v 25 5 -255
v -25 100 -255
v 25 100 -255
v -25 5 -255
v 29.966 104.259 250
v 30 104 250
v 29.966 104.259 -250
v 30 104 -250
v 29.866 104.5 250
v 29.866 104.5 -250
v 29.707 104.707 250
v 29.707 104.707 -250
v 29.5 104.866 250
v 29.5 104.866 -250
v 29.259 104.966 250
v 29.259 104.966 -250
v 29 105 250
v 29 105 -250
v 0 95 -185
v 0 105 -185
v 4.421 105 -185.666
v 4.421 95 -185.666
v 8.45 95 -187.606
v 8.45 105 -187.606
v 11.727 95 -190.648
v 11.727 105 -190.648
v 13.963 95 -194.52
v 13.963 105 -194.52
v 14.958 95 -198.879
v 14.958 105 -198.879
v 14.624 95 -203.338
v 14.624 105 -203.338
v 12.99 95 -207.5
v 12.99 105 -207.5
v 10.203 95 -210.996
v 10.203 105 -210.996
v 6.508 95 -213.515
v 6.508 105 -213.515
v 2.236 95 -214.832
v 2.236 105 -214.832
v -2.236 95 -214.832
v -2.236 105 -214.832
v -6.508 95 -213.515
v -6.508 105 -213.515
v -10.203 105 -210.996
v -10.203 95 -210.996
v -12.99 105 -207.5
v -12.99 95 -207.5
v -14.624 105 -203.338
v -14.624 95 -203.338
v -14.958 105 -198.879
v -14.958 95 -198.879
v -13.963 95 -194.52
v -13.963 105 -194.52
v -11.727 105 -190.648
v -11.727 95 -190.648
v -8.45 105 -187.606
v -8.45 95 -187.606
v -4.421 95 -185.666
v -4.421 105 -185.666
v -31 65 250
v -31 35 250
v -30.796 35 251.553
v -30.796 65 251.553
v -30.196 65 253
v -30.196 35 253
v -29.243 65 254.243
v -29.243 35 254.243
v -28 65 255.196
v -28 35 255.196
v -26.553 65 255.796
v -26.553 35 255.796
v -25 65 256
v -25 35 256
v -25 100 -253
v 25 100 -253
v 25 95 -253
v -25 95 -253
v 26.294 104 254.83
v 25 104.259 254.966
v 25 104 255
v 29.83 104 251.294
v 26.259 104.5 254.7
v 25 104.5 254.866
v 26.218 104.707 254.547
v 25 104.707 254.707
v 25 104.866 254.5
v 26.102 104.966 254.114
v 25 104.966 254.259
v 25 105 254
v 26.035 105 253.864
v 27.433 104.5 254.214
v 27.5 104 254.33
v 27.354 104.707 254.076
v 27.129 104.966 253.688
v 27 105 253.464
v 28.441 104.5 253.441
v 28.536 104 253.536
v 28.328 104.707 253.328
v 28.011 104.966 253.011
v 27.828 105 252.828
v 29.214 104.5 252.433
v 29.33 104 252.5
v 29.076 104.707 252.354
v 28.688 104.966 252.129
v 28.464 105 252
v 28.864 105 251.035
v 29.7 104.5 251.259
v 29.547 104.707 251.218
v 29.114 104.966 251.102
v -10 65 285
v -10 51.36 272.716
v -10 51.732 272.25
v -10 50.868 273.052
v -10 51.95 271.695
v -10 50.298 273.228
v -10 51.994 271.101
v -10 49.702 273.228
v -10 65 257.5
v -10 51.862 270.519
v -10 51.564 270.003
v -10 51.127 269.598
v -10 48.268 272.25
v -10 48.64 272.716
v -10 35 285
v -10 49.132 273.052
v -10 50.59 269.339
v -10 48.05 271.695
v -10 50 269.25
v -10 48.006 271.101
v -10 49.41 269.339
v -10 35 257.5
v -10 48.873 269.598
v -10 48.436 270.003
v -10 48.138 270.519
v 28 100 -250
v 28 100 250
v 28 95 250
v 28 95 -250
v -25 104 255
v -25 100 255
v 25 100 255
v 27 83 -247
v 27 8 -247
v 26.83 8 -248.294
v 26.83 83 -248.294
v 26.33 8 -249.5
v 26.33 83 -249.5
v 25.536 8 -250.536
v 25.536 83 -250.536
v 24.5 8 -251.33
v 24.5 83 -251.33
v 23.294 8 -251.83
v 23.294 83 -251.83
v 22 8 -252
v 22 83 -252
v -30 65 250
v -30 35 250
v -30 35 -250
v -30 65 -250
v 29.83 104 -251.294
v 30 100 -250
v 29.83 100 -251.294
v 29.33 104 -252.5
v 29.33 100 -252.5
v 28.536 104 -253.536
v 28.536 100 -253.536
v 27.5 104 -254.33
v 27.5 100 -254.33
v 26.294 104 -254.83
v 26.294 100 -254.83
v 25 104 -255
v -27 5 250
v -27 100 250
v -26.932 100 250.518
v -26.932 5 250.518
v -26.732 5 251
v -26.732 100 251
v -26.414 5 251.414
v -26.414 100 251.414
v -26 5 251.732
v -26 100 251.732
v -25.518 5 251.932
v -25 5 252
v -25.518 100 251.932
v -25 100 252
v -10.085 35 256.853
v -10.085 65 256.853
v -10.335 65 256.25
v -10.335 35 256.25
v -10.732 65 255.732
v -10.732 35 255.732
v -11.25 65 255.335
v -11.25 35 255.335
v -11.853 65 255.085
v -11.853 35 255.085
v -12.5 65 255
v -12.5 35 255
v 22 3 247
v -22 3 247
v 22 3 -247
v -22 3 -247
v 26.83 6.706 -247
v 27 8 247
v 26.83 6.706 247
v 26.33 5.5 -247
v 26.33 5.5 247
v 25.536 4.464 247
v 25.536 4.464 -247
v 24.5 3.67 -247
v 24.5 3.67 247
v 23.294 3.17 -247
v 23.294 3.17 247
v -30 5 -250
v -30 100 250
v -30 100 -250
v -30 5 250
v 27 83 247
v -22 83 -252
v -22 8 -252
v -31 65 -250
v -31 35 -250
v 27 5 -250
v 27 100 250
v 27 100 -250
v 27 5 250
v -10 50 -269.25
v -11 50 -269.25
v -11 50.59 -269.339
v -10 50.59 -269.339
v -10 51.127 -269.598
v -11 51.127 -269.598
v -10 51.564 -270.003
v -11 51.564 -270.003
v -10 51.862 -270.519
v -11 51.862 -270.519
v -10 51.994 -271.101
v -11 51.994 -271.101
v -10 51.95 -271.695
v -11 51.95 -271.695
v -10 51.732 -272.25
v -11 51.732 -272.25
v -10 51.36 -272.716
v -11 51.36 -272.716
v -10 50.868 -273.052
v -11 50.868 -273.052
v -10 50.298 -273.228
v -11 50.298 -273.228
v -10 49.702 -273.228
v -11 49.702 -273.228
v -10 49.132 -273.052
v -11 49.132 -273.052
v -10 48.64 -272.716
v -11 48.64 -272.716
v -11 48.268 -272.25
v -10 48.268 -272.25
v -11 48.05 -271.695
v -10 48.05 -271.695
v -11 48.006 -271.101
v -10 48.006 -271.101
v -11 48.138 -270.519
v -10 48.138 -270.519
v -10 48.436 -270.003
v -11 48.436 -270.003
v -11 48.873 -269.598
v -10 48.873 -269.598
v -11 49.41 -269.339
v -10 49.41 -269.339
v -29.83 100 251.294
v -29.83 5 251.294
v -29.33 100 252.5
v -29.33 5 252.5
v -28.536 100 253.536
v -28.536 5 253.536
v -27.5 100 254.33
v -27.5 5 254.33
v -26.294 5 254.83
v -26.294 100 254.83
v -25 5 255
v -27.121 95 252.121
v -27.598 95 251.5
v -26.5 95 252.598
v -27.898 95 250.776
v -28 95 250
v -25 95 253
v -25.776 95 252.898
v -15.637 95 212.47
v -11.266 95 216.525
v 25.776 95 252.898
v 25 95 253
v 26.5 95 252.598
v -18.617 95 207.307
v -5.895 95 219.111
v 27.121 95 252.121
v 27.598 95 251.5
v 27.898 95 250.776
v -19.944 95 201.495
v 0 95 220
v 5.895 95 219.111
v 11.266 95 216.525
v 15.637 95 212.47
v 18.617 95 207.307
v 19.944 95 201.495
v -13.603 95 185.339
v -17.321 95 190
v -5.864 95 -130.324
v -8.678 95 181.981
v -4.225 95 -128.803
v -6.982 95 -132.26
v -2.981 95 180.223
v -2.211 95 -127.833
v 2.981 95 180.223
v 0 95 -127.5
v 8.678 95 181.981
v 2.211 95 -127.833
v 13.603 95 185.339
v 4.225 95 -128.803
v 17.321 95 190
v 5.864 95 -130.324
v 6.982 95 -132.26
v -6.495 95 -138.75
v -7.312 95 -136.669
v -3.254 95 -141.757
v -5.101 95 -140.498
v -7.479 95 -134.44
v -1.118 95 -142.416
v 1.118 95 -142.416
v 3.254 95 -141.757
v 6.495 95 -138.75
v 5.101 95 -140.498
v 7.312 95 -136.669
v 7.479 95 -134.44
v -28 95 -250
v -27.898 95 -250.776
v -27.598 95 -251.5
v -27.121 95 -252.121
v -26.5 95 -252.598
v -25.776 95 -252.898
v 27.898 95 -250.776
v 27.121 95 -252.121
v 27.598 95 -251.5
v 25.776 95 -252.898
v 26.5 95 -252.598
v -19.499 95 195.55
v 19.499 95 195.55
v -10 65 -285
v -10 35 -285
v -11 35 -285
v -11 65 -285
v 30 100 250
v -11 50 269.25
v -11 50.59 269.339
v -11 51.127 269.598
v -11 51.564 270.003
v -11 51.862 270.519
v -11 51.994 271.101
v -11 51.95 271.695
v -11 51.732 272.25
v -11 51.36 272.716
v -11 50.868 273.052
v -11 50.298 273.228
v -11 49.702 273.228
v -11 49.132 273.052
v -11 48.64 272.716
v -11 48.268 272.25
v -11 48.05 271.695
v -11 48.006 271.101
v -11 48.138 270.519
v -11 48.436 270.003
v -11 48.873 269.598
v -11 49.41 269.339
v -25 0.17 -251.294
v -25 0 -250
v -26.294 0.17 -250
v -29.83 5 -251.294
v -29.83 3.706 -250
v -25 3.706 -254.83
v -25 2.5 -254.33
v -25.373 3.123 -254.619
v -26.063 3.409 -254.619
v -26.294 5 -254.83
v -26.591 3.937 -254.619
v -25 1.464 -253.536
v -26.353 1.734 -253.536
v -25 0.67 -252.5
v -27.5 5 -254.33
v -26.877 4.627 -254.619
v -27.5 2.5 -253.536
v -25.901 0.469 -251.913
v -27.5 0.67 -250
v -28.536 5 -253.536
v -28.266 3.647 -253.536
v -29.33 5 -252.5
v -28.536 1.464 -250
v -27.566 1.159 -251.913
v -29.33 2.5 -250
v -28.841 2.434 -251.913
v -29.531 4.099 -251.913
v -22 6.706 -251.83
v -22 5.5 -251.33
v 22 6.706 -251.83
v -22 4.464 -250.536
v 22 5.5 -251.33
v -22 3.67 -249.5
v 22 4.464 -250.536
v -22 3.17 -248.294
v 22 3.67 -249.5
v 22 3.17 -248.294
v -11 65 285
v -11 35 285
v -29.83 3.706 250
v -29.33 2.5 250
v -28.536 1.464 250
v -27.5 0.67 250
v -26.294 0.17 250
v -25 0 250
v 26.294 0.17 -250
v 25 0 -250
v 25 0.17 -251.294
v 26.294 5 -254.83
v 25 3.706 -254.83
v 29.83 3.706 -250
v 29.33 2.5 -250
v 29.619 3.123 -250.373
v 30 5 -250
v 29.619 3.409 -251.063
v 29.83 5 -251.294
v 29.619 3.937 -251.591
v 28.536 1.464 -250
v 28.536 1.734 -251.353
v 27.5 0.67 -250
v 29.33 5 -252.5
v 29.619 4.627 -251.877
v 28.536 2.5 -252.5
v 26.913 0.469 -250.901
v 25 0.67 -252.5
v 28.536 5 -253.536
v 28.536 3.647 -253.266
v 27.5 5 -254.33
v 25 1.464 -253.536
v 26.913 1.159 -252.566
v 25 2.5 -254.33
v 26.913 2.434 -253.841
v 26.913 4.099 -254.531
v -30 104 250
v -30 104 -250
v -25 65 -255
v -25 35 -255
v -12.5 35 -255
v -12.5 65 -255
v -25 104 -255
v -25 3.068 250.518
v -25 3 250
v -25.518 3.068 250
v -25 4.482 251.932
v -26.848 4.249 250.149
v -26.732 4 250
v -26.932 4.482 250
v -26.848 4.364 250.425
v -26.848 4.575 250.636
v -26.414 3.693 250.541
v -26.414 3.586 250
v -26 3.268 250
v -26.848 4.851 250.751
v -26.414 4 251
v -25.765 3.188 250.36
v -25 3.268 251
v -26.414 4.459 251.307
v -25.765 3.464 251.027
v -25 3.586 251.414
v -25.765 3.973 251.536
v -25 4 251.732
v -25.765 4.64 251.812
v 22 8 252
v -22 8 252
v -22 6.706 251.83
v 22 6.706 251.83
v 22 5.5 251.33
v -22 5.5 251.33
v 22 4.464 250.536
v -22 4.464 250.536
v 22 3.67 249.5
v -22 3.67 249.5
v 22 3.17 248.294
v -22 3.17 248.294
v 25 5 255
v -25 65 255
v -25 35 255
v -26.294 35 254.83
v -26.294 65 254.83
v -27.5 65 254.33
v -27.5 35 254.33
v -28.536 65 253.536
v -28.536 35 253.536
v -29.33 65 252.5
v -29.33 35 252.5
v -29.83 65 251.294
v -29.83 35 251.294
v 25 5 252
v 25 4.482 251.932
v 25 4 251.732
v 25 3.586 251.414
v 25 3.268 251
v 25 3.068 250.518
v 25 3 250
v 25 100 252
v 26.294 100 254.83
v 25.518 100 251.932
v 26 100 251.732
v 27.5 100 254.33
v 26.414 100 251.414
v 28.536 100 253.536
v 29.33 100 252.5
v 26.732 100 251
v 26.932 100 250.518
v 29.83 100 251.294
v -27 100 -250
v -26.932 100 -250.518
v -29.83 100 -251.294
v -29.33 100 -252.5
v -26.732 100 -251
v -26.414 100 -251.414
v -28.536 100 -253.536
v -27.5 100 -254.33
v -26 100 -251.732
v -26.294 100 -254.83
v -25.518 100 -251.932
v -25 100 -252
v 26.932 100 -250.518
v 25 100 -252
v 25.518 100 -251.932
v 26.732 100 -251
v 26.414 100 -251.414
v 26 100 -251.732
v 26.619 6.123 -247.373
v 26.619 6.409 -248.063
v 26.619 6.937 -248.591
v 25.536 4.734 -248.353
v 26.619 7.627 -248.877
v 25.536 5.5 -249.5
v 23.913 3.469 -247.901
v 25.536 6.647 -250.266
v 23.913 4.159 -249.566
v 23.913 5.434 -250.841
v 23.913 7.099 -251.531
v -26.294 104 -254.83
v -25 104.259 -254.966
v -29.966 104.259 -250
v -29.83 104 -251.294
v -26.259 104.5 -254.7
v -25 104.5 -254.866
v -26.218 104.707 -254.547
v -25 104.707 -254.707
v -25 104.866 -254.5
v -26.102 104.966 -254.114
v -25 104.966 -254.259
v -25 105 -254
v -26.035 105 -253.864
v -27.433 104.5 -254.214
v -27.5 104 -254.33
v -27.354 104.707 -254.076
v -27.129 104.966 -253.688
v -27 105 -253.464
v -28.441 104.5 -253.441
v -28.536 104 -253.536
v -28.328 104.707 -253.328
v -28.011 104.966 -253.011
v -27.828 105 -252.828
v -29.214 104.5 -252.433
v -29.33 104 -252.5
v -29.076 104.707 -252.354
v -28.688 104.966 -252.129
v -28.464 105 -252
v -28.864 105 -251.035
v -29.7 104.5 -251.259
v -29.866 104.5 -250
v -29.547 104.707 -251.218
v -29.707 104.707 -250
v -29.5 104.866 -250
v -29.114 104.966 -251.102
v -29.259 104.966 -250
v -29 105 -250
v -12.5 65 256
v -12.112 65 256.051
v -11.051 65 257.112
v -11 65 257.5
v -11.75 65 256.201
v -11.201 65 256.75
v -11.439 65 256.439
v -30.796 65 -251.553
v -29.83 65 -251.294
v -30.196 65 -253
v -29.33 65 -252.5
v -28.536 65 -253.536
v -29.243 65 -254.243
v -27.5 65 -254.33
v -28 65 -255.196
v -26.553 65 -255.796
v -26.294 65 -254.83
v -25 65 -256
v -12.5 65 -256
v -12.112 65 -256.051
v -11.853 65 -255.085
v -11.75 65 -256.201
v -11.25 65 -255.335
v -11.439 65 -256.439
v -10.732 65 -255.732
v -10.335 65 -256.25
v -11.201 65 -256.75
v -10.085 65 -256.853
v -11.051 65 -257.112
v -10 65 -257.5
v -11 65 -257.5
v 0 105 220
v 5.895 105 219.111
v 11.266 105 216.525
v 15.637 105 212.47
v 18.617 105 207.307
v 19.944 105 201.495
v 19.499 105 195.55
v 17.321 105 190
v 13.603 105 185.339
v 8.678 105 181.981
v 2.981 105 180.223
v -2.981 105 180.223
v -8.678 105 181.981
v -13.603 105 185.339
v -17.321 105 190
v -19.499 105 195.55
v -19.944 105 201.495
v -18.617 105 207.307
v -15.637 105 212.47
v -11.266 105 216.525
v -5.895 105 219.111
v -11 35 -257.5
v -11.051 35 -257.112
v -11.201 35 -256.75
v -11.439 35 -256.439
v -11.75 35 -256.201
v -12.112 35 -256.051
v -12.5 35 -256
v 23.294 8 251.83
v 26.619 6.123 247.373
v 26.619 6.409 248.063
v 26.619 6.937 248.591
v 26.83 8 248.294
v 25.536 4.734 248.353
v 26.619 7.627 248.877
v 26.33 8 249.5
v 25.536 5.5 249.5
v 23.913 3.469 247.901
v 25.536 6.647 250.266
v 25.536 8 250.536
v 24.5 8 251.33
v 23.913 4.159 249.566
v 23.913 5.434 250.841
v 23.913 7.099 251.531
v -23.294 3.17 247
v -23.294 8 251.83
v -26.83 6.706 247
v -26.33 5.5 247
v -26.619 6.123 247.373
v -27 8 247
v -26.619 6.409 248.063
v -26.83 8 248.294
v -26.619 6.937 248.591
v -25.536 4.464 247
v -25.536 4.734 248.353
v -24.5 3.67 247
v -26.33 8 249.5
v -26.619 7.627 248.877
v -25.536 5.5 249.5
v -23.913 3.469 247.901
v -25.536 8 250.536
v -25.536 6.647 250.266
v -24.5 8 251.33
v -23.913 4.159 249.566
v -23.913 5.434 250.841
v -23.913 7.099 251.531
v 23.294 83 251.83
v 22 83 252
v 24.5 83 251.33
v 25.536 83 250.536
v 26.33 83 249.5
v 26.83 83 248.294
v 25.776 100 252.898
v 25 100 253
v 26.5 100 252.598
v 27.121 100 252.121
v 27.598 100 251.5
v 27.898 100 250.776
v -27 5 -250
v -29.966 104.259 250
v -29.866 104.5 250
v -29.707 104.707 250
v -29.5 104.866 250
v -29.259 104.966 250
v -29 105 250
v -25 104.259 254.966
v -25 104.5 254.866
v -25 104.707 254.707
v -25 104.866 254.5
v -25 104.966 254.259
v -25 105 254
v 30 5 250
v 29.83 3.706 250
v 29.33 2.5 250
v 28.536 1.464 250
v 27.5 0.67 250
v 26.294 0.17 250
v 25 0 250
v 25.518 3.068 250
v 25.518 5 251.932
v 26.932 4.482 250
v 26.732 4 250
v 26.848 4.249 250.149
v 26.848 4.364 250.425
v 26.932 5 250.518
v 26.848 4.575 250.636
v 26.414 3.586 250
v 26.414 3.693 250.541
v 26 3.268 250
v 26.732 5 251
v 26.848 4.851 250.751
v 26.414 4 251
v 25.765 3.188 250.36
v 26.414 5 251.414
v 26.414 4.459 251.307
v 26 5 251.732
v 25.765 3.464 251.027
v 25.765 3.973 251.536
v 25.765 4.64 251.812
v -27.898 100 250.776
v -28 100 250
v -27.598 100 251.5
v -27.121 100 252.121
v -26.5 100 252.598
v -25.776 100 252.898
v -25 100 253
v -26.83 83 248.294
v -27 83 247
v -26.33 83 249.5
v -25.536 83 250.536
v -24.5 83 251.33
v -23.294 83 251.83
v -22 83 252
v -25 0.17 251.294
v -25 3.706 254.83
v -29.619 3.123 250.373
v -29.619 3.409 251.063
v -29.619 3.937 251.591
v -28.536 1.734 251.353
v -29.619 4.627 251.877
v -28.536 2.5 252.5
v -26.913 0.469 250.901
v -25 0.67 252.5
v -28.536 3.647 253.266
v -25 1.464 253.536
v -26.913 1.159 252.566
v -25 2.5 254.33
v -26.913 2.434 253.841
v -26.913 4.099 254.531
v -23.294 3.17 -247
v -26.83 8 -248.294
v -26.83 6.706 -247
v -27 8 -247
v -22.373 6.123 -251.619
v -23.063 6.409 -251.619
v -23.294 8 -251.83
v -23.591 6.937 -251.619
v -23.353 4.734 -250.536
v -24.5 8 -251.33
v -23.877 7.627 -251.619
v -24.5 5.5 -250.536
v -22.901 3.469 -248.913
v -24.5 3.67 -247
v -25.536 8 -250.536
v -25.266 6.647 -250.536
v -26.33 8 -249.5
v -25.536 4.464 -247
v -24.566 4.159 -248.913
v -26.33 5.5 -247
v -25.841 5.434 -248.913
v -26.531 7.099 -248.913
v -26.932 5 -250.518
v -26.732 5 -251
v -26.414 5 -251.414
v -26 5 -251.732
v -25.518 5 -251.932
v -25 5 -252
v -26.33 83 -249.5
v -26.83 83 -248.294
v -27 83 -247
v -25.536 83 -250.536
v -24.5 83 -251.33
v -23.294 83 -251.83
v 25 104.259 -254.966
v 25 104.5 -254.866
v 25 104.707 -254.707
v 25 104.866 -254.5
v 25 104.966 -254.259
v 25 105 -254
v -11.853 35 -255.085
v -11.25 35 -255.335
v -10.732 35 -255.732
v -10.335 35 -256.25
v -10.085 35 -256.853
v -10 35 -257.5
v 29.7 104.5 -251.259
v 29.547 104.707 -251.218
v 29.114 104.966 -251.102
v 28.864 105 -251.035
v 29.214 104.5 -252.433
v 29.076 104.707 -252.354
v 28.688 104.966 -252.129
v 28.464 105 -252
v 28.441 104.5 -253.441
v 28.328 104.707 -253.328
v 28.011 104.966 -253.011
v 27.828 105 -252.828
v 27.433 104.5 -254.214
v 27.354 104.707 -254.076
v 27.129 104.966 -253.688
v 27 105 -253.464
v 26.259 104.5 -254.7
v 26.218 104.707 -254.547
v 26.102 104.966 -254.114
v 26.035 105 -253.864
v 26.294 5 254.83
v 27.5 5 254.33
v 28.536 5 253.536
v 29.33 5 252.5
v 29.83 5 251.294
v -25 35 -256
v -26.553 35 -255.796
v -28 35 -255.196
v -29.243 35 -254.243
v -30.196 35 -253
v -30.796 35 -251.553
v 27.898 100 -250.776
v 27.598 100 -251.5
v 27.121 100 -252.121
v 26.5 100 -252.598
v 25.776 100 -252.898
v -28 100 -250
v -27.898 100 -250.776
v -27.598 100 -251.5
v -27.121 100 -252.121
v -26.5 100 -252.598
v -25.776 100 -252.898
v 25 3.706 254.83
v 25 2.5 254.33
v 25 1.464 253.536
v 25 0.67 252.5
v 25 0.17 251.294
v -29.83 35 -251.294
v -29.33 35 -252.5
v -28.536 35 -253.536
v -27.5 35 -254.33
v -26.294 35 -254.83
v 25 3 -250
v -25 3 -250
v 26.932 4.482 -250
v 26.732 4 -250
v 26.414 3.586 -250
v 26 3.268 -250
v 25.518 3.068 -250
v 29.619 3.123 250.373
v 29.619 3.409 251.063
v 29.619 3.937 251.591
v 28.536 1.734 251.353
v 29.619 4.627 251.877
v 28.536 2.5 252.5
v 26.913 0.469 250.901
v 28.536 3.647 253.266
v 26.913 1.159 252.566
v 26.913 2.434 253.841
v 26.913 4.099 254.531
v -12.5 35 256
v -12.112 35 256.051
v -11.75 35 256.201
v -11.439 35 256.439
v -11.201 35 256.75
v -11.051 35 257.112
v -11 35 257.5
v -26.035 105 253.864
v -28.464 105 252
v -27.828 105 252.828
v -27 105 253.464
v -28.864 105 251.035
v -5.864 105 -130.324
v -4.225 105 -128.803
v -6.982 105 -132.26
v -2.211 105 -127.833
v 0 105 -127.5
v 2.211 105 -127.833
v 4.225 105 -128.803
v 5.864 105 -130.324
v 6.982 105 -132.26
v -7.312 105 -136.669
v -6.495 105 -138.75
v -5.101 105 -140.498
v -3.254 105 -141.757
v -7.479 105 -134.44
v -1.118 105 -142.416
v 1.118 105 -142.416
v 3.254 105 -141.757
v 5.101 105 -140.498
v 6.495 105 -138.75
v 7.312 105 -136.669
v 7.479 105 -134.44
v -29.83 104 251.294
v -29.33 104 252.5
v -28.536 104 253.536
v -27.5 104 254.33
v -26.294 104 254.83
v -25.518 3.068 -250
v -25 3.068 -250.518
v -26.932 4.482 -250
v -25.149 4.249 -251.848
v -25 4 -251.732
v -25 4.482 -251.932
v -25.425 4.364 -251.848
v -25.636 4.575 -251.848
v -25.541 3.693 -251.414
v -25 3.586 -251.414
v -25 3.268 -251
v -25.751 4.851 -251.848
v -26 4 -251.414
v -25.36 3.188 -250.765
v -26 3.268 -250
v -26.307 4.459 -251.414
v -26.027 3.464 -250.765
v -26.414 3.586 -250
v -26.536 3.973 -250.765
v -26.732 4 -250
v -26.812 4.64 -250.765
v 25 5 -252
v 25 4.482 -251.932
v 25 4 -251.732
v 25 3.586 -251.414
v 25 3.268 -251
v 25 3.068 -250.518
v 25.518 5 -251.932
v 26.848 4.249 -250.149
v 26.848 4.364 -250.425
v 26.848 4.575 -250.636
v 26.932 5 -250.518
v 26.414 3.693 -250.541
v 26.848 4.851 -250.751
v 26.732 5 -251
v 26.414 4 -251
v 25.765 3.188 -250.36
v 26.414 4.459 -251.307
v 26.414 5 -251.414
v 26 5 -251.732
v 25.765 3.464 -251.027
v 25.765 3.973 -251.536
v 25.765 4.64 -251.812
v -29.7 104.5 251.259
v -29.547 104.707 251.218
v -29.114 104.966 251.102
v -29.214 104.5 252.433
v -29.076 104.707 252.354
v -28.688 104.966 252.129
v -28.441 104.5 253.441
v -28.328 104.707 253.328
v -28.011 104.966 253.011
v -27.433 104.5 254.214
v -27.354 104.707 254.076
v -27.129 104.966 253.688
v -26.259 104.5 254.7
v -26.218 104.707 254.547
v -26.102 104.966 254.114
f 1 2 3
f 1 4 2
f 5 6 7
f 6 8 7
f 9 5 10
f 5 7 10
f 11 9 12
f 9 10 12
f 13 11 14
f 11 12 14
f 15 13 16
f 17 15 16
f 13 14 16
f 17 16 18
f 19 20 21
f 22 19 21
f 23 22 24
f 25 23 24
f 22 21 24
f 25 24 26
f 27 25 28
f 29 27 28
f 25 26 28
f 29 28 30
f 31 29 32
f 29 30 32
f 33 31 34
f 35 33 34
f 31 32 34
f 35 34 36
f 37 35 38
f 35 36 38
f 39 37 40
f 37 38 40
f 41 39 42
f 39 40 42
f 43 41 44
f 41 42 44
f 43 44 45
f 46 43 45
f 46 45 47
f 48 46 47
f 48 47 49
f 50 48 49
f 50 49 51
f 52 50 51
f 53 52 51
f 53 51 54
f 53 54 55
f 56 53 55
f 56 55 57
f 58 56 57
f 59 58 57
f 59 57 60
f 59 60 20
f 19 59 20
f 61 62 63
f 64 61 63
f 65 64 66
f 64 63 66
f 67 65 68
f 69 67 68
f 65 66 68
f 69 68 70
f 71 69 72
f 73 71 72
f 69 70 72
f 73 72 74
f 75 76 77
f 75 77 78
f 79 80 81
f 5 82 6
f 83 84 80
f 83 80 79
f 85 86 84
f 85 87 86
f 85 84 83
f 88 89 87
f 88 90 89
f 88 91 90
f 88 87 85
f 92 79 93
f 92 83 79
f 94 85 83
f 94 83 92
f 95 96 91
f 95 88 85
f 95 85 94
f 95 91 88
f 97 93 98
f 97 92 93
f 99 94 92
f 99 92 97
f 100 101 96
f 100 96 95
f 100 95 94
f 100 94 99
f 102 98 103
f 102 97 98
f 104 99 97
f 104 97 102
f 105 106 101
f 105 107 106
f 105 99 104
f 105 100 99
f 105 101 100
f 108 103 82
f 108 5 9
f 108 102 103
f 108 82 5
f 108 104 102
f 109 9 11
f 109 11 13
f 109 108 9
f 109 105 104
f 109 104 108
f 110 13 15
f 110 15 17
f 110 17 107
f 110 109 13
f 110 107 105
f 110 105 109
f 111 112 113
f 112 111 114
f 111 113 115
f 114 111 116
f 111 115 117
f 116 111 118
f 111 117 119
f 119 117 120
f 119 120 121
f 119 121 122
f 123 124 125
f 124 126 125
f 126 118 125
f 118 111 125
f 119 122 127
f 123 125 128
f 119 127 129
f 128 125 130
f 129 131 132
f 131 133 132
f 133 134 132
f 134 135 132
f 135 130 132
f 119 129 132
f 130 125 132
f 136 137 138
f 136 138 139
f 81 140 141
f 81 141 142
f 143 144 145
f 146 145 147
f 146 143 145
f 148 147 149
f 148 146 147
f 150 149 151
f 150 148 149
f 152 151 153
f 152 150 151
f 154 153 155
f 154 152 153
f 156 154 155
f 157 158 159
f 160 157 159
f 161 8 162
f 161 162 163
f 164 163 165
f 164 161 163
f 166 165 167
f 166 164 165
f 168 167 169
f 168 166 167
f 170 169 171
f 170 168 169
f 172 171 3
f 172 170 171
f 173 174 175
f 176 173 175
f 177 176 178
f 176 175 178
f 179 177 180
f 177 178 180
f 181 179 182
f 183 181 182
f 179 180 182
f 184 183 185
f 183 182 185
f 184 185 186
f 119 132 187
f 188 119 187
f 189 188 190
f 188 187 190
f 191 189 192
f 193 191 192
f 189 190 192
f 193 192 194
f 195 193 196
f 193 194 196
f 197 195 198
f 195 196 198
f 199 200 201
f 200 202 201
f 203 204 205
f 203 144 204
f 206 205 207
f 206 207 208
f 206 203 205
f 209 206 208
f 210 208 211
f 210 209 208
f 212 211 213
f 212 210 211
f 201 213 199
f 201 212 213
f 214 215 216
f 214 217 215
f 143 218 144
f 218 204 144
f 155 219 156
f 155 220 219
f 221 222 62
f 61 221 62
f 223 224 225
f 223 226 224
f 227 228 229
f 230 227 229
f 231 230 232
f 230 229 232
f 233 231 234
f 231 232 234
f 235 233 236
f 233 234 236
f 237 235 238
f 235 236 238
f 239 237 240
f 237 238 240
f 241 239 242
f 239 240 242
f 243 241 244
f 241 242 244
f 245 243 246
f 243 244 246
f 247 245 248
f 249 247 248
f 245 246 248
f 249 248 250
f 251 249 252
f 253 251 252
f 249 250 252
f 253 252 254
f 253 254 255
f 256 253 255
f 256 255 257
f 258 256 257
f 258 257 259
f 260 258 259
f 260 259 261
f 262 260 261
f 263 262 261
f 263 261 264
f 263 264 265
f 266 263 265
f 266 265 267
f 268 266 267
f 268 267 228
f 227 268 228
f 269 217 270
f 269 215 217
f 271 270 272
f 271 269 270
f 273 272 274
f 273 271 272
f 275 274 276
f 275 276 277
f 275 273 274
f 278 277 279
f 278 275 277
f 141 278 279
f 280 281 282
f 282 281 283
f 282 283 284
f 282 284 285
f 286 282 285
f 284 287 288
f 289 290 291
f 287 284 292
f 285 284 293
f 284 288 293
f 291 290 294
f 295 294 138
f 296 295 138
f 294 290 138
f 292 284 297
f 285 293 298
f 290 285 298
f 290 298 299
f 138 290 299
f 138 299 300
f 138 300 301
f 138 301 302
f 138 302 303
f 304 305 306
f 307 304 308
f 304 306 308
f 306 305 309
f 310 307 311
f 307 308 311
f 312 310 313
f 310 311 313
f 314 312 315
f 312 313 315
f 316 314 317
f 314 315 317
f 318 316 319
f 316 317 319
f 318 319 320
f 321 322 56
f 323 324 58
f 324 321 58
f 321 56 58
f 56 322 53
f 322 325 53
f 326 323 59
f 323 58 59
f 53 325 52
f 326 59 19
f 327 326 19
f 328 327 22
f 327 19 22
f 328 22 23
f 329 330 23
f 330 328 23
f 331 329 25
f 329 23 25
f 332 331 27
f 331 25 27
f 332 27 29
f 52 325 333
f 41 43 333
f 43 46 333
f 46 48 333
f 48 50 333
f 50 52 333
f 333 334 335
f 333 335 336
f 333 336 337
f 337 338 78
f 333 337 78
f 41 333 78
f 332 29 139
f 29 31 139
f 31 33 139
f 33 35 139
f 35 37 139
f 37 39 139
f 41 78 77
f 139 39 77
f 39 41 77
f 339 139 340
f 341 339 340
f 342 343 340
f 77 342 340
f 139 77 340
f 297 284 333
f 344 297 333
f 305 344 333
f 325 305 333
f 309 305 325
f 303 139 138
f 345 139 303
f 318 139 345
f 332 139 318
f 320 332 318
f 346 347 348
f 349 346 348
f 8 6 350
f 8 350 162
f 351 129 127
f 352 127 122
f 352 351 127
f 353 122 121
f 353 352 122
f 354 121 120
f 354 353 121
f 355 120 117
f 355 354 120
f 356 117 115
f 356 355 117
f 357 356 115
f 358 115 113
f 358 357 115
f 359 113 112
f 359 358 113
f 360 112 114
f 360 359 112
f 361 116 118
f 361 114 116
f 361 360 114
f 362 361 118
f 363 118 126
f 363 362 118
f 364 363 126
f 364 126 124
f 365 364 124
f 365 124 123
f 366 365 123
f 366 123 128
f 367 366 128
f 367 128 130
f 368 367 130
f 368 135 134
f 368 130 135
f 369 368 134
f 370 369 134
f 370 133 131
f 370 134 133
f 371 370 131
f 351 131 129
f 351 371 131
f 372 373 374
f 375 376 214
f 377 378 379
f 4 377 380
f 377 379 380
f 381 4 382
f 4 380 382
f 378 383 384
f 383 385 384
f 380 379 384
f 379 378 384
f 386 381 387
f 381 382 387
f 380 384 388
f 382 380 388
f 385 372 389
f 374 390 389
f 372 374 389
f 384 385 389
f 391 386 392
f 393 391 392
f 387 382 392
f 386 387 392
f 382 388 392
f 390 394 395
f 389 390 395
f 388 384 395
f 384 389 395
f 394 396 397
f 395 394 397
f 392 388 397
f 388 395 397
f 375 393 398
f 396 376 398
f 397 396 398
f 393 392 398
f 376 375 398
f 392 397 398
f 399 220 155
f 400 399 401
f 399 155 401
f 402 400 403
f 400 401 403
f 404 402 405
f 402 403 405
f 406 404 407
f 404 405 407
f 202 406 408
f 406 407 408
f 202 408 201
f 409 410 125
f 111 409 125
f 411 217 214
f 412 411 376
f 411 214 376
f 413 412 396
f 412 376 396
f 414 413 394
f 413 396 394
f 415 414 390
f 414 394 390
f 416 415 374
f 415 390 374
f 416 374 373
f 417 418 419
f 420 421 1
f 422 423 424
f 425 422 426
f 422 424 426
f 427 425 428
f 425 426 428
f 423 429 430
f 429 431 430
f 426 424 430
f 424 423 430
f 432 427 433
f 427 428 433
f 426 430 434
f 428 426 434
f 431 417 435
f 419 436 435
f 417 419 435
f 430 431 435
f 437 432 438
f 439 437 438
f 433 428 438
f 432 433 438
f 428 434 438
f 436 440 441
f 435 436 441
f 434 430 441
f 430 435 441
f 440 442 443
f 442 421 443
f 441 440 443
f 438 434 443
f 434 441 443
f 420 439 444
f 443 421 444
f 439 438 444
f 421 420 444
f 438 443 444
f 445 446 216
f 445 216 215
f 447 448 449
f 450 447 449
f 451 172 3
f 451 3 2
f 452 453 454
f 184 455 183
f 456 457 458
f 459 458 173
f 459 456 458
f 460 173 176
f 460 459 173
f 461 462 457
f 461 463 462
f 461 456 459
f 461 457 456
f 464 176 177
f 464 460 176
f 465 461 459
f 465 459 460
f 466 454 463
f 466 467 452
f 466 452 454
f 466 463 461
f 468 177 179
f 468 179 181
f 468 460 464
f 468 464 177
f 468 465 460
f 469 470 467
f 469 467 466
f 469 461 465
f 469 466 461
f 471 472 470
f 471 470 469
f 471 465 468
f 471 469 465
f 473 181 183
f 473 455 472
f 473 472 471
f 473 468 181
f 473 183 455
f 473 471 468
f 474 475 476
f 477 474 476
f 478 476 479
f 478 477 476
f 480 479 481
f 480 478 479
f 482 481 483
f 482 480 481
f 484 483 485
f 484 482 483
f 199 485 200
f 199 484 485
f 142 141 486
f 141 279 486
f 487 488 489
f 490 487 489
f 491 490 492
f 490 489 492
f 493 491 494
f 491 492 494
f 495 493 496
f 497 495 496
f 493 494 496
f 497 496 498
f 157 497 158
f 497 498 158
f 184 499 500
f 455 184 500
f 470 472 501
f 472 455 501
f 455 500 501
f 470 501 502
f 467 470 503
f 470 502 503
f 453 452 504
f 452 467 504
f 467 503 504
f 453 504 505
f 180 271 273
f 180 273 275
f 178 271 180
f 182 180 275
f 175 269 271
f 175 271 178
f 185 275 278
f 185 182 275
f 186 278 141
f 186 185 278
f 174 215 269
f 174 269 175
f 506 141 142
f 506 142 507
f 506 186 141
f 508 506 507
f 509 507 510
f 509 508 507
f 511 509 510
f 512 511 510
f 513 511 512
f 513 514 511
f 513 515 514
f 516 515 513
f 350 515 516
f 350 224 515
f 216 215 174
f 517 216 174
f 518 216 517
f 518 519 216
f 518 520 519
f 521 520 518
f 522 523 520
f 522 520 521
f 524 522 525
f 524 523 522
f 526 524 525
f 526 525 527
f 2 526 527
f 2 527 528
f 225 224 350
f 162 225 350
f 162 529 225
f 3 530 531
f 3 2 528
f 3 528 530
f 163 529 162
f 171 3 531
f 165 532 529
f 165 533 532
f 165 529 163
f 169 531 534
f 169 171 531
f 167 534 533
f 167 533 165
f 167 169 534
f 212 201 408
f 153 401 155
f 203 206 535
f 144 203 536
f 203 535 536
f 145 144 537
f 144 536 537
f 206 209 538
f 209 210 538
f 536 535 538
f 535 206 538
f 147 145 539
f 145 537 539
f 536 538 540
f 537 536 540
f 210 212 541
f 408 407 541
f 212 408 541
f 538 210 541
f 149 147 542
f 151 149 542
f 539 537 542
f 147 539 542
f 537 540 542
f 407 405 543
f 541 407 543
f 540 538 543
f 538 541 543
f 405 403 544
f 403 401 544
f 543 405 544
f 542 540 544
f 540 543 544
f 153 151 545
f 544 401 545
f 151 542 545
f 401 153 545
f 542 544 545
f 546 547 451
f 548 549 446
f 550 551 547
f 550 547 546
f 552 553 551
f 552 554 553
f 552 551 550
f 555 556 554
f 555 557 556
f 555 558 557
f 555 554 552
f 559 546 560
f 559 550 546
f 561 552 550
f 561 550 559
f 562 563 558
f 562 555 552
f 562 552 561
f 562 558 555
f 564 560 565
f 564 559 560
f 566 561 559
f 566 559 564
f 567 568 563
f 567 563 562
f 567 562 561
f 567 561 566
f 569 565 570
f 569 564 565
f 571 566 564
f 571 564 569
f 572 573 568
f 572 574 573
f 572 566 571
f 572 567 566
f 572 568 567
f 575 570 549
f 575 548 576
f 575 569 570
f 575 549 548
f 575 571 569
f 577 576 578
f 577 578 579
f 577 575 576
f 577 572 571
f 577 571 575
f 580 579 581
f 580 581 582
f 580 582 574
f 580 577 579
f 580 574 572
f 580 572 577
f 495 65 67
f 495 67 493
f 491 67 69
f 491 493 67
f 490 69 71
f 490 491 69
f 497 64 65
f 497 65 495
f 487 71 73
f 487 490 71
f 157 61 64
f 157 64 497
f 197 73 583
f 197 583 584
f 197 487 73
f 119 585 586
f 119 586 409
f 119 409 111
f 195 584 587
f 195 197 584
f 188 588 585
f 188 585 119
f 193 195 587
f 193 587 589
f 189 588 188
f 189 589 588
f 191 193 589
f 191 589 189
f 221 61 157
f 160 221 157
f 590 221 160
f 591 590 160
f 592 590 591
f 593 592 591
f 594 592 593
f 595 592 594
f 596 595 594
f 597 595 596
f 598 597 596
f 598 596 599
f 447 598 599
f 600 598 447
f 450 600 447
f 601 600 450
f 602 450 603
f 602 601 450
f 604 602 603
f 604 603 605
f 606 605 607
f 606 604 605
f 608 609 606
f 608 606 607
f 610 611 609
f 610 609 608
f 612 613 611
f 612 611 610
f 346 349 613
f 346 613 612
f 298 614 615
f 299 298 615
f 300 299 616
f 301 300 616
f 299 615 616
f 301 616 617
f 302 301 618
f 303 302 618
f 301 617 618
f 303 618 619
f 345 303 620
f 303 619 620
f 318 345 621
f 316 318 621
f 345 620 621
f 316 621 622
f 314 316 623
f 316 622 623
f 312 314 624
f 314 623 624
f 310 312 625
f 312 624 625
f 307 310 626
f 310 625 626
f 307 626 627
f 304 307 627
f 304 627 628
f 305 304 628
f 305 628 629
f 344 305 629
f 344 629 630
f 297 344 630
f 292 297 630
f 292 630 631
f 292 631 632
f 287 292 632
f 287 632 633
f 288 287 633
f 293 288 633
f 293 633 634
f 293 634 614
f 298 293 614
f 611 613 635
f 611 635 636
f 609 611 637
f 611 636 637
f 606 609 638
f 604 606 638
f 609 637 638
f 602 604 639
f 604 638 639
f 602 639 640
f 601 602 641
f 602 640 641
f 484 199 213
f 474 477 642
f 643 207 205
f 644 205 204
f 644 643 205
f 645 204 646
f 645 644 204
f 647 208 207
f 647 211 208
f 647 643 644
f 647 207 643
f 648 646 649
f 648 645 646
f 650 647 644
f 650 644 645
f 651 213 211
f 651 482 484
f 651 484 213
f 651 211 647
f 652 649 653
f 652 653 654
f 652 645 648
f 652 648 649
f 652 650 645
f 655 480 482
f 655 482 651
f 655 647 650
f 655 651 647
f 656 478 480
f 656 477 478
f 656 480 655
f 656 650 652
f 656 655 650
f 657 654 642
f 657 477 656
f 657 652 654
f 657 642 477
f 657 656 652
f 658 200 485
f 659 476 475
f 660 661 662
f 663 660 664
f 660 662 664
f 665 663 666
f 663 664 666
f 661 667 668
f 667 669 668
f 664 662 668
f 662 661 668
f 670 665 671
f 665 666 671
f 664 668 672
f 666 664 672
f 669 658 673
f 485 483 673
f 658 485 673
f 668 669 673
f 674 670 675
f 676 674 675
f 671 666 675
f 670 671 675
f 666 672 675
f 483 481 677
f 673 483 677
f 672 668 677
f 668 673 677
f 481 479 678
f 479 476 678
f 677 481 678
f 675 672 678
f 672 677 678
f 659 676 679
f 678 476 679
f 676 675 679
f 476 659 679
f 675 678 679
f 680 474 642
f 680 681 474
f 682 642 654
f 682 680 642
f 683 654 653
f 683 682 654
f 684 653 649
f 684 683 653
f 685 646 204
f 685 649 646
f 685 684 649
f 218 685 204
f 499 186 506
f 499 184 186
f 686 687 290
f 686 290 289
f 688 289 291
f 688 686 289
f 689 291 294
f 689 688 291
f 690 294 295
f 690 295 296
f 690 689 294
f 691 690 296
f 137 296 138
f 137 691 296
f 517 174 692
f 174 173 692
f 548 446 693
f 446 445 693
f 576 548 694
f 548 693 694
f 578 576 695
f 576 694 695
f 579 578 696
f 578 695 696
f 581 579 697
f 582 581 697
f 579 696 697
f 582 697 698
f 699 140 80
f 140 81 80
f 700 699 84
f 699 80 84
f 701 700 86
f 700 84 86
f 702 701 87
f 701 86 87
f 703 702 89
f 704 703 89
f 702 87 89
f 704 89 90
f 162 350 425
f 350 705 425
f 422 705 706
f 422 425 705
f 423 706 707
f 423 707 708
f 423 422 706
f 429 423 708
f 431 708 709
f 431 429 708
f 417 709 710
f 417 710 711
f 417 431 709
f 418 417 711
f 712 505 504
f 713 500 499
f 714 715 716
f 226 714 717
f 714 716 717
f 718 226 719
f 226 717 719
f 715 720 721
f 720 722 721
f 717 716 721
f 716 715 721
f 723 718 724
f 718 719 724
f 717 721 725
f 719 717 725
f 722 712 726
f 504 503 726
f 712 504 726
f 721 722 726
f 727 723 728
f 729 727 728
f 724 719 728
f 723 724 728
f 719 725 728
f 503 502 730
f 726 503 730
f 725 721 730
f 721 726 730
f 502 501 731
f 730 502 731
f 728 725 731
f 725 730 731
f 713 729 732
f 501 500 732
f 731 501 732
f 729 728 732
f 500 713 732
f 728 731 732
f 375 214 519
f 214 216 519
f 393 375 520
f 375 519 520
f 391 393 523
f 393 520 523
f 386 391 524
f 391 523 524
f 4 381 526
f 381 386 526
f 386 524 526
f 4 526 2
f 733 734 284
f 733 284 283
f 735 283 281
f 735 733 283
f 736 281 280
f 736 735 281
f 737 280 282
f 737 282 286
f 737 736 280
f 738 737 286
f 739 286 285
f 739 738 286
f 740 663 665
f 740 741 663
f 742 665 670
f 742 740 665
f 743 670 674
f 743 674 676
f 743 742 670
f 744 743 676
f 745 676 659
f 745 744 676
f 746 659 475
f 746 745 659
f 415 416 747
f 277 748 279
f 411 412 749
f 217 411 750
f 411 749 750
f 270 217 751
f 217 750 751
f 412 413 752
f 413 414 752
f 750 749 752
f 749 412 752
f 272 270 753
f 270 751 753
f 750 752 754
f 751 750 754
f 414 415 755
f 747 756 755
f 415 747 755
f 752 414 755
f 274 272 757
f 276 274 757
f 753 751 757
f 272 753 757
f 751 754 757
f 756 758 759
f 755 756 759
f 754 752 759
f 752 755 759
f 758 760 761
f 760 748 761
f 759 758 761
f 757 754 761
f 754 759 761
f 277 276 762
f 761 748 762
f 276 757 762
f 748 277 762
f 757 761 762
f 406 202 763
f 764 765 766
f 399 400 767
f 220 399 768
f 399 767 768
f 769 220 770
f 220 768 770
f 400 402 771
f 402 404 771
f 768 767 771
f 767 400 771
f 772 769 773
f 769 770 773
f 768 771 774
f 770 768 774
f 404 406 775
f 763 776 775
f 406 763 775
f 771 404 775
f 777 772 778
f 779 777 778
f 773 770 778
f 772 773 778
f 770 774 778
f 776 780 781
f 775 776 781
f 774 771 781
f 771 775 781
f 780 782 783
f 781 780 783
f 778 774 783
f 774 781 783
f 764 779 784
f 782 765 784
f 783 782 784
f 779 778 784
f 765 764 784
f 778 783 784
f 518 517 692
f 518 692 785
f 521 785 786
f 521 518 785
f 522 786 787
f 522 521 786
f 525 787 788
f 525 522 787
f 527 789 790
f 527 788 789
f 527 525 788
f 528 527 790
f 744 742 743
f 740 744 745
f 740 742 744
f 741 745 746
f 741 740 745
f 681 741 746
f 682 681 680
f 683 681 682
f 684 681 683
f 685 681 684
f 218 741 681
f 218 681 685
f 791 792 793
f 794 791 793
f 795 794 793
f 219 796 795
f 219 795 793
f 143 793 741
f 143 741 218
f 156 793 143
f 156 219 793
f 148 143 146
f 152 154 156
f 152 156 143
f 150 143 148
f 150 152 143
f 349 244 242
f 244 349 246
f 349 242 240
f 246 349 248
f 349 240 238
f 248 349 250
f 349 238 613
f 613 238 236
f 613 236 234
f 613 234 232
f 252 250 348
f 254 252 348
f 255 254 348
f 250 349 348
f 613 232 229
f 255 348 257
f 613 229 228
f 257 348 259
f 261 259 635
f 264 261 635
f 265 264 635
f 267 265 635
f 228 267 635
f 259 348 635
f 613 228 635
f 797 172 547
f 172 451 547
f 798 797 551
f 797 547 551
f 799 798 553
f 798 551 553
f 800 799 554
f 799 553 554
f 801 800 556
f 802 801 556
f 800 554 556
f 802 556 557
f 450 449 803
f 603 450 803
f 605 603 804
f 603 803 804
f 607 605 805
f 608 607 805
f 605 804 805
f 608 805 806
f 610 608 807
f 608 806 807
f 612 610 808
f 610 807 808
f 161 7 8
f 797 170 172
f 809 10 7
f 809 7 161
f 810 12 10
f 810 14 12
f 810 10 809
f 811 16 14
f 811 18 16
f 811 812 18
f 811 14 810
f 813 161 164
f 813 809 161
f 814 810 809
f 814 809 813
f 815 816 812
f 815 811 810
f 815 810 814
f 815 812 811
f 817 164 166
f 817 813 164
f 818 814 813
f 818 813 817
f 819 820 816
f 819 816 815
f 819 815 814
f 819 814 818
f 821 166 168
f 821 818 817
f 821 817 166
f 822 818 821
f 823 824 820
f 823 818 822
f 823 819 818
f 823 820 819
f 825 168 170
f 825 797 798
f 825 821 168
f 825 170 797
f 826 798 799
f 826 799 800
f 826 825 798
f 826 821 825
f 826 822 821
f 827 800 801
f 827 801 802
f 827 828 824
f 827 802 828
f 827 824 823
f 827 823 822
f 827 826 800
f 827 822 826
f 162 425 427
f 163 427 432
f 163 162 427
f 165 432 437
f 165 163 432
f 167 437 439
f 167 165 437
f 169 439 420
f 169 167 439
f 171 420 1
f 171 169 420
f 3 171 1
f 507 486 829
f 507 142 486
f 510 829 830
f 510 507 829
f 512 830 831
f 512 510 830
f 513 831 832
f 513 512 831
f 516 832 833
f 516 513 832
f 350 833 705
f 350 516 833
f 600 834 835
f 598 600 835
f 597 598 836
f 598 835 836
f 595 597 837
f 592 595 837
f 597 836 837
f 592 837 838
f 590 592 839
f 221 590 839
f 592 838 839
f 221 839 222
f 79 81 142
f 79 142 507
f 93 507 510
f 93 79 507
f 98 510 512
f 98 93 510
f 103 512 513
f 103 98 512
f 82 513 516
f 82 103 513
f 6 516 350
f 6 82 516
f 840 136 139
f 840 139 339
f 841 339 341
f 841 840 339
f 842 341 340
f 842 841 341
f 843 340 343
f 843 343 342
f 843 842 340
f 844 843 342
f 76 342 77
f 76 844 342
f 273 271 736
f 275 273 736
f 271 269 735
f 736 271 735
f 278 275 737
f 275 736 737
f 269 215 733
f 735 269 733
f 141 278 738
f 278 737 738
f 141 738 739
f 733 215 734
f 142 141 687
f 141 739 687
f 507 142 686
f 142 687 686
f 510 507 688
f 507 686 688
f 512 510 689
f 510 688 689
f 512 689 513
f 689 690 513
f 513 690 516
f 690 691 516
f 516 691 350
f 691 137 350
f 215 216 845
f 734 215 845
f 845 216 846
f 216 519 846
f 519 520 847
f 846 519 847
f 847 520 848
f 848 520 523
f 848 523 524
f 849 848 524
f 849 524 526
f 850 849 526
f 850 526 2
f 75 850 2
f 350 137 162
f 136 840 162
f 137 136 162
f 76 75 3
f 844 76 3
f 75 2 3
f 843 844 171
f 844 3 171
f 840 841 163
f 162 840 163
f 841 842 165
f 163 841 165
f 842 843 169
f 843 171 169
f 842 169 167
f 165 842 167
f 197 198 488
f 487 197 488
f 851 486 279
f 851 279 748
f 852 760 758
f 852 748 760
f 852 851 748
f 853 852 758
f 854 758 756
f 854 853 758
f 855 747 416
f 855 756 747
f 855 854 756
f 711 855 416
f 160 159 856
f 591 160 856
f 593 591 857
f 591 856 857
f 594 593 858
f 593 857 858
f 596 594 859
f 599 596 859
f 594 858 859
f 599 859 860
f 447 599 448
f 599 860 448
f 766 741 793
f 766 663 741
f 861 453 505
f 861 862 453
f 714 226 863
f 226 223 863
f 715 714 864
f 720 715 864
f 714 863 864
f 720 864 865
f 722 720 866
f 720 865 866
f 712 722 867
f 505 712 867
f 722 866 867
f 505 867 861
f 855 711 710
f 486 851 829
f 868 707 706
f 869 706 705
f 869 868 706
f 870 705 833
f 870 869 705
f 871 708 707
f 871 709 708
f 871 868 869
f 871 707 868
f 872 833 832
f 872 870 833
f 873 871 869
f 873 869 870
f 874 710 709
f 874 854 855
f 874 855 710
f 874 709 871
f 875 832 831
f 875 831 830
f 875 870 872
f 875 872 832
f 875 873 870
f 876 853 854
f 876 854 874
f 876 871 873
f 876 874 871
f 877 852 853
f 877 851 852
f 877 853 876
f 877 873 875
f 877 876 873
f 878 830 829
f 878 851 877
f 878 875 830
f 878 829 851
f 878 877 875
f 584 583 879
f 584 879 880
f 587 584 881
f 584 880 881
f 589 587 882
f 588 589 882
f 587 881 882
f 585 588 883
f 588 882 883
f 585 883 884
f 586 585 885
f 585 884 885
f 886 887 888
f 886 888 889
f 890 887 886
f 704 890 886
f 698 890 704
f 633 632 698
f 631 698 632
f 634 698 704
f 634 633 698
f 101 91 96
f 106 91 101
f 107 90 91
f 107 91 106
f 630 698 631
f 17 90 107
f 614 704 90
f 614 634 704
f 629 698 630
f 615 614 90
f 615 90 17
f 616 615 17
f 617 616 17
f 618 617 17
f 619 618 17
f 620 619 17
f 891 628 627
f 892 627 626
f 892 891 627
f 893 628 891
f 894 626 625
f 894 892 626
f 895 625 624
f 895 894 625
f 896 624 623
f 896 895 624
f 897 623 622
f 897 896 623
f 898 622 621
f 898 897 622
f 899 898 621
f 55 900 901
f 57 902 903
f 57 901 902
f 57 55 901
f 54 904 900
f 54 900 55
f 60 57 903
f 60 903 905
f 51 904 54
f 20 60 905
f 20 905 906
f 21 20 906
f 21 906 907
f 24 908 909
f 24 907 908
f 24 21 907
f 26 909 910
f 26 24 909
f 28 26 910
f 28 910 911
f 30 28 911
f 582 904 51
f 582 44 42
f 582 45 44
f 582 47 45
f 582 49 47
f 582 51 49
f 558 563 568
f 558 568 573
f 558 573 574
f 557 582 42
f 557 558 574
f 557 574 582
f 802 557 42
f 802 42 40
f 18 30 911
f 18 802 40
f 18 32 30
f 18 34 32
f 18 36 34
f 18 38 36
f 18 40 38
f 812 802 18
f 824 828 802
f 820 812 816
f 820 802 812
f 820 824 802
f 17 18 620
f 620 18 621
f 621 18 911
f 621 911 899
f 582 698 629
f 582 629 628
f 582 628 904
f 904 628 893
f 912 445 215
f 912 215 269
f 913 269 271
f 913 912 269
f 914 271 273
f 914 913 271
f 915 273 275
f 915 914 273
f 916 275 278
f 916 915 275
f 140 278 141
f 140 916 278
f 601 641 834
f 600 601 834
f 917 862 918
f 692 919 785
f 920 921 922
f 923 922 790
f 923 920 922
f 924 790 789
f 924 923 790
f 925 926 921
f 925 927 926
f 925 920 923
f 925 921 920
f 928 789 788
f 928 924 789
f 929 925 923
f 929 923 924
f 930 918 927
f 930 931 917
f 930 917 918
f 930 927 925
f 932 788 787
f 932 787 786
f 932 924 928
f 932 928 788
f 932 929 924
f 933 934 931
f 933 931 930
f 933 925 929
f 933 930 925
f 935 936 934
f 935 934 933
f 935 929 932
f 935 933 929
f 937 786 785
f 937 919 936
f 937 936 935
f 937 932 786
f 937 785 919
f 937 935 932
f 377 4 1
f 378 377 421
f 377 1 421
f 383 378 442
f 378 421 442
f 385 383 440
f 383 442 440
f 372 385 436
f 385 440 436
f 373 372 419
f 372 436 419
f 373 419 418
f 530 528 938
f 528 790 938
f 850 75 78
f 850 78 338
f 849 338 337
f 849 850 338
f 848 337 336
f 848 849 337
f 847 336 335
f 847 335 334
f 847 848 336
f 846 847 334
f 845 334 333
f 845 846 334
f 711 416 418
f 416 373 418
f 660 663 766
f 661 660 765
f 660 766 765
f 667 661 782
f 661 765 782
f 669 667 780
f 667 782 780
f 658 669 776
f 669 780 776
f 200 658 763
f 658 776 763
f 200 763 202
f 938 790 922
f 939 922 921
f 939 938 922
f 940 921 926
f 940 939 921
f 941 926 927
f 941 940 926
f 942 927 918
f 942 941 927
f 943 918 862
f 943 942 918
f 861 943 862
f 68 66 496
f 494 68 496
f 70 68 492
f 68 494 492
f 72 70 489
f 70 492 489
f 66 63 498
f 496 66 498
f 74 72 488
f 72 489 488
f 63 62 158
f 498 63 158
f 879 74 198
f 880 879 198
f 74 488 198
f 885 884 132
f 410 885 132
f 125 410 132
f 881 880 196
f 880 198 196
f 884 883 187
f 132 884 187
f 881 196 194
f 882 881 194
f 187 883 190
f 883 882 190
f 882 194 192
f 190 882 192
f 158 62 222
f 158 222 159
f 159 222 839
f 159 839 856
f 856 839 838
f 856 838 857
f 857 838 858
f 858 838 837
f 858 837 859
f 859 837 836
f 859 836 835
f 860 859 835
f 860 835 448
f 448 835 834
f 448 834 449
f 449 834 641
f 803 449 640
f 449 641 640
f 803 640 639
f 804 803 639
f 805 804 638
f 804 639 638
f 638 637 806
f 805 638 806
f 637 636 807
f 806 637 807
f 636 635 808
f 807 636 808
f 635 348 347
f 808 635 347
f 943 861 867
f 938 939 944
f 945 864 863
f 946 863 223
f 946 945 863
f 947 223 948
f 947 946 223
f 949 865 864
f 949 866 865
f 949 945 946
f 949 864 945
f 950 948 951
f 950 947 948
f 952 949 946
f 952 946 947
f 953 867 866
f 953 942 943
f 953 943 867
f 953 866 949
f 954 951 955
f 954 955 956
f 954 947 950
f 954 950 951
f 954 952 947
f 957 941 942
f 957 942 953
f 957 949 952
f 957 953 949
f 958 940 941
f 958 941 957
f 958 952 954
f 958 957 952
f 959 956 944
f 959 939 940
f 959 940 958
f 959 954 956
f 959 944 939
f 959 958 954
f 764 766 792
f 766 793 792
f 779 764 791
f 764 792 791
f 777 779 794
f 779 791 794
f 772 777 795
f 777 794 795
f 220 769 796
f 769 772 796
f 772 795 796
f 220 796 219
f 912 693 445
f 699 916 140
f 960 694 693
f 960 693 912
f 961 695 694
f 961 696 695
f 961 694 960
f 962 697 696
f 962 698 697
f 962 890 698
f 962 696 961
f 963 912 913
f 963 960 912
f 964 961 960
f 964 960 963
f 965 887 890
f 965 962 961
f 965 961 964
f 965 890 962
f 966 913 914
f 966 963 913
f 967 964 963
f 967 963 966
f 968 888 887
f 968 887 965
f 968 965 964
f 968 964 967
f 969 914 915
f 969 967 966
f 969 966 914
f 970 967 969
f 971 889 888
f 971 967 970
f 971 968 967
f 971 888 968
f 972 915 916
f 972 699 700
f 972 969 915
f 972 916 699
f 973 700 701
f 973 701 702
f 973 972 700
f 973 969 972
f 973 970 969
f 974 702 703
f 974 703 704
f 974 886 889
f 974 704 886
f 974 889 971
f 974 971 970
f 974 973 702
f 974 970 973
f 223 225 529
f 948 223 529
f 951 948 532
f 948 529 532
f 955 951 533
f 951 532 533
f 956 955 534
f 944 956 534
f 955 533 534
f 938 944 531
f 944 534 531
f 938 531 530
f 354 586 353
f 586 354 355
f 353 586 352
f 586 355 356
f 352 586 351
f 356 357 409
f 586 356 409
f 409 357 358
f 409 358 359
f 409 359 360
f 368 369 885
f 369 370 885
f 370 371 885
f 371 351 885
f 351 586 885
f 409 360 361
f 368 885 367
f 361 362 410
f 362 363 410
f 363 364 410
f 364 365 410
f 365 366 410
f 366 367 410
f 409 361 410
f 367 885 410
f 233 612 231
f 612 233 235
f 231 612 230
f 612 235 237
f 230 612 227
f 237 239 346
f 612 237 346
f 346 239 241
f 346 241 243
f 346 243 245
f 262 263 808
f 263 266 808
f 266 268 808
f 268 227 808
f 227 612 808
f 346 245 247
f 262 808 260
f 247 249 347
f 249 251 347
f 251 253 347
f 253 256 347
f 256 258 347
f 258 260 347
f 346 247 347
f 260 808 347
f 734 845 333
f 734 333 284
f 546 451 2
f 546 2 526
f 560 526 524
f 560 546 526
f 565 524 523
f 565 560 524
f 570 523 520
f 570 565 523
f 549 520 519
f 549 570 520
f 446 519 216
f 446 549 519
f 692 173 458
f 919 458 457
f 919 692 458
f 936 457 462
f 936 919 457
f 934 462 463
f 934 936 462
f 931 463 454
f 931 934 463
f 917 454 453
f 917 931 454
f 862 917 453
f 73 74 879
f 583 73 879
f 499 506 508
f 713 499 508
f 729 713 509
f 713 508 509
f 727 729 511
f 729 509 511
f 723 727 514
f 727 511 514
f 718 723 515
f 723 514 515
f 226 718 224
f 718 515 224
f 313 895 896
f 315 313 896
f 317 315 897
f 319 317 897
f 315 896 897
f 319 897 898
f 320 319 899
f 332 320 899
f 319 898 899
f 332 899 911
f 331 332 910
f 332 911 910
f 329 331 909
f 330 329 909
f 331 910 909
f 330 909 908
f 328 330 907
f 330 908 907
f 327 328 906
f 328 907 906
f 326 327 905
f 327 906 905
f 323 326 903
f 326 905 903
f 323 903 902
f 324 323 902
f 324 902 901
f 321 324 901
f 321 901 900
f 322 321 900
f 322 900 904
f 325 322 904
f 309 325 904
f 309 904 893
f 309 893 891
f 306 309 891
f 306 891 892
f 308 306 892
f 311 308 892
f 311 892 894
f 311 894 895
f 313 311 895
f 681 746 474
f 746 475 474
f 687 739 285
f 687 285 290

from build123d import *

# Parameters (mm, degrees)
CROQUIS1_W         = 60
CROQUIS1_H         = 510
EXTRUIR1_DEPTH     = 100
REDONDEO1_R        = 5
VACIADO1_T         = -3
CROQUIS2_W         = 54
CROQUIS2_H         = 504
EXTRUIR2_DEPTH     = 80
REDONDEO2_R        = 5
EXTRUIR3_DEPTH     = 5
EXTRUIR4_START     = 5
EXTRUIR4_DEPTH     = 5
REDONDEO3_R        = 1
CROQUIS5_R         = 15
CROQUIS5_R_2       = 7.5
CROQUIS5_R_3       = 20
EXTRUIR5_DEPTH     = 15
DAR_START          = 35
DAR_ESPESOR1_DEPTH = 30
CROQUIS7_R         = 2
EXTRUIR6_DEPTH     = 30


# Read off the part's stored shape, not the designer's step: Dar espesor1
with BuildPart() as part:
    # Croquis1 → Extruir1 (new body)
    with BuildSketch(Plane(origin=(0, 0, 0), x_dir=(1, 0, 0), z_dir=(0, 1, 0))):
        Rectangle(CROQUIS1_W, CROQUIS1_H)
    extrude(amount=EXTRUIR1_DEPTH)

    # Redondeo1
    redondeo1_edges = [part.edges().sort_by_distance(p)[0] for p in [
        (0, 0, 255),
        (-30, 0, 0),
        (0, 0, -255),
        (30, 0, 0),
        (30, 50, 255),
        (-30, 50, 255),
        (-30, 50, -255),
        (30, 50, -255),
    ]]
    fillet(redondeo1_edges, radius=REDONDEO1_R)

    # Vaciado1
    vaciado1_openings = [part.faces().sort_by_distance(p)[0] for p in [
        (0, 100, 0),
    ]]
    offset(amount=VACIADO1_T, openings=vaciado1_openings, kind=Kind.INTERSECTION)


with BuildPart() as body_2:
    # Croquis2 → Extruir2 (new body)
    with BuildSketch(Plane(origin=(0, 3, 0), x_dir=(1, 0, 0), z_dir=(0, 1, 0))):
        Rectangle(CROQUIS2_W, CROQUIS2_H)
    extrude(amount=EXTRUIR2_DEPTH)

    # Redondeo2
    redondeo2_edges = [body_2.edges().sort_by_distance(p)[0] for p in [
        (0, 3, 252),
        (-27, 3, 0),
        (0, 3, -252),
        (27, 3, 0),
        (27, 43, 252),
        (-27, 43, 252),
        (-27, 43, -252),
        (27, 43, -252),
    ]]
    fillet(redondeo2_edges, radius=REDONDEO2_R)


with BuildPart() as body_3:
    # Croquis3 → Extruir3 (new body)
    with BuildSketch(Plane(origin=(0, 100, 0), x_dir=(1, 0, 0), z_dir=(0, 1, 0))):
        with BuildLine():
            Line((25, 253), (-25, 253))
            ThreePointArc((-25, 253), (-27.121320344, 252.121320344), (-28, 250))
            Line((-28, 250), (-28, -250))
            ThreePointArc((-28, -250), (-27.121320344, -252.121320344), (-25, -253))
            Line((-25, -253), (25, -253))
            ThreePointArc((25, -253), (27.121320344, -252.121320344), (28, -250))
            Line((28, -250), (28, 250))
            ThreePointArc((28, 250), (27.121320344, 252.121320344), (25, 253))
        make_face()
    extrude(amount=-EXTRUIR3_DEPTH)

    # Croquis4 → Extruir4 (add)
    with BuildSketch(Plane(origin=(0, 100, 0), x_dir=(1, 0, 0), z_dir=(0, 1, 0)).offset(EXTRUIR4_START)):
        with BuildLine():
            Line((-25, -255), (25, -255))
            ThreePointArc((25, -255), (28.535533906, -253.535533906), (30, -250))
            Line((30, -250), (30, 250))
            ThreePointArc((30, 250), (28.535533906, 253.535533906), (25, 255))
            Line((25, 255), (-25, 255))
            ThreePointArc((-25, 255), (-28.535533906, 253.535533906), (-30, 250))
            Line((-30, 250), (-30, -250))
            ThreePointArc((-30, -250), (-28.535533906, -253.535533906), (-25, -255))
        make_face()
    extrude(amount=-EXTRUIR4_DEPTH)

    # Redondeo3
    redondeo3_edges = [body_3.edges().sort_by_distance(p)[0] for p in [
        (-28.535533906, 105, 253.535533906),
        (0, 105, 255),
        (28.535533906, 105, 253.535533906),
        (30, 105, 0),
        (28.535533906, 105, -253.535533906),
        (0, 105, -255),
        (-28.535533906, 105, -253.535533906),
        (-30, 105, 0),
    ]]
    fillet(redondeo3_edges, radius=REDONDEO3_R)

    # Croquis5 → Extruir5 (cut)
    with BuildSketch(Plane(origin=(0, 105, 0), x_dir=(1, 0, 0), z_dir=(0, 1, 0))):
        with Locations(Location((0, 200, 0), (0, 0, 270))):
            Circle(CROQUIS5_R)
        with Locations(Location((0, 135, 0), (0, 0, 270))):
            Circle(CROQUIS5_R_2)
        with Locations(Location((0, -200, 0), (0, 0, 270))):
            Circle(CROQUIS5_R_3)
    extrude(amount=-EXTRUIR5_DEPTH, mode=Mode.SUBTRACT)


with BuildPart() as body_4:
    # Dar espesor1 outline → Dar espesor1 (new body)
    with BuildSketch(Plane(origin=(0, 0, 0), x_dir=(1, 0, 0), z_dir=(0, 1, 0)).offset(DAR_START)):
        with BuildLine():
            Line((-10, 257.5), (-10, 285))
            Line((-10, 285), (-11, 285))
            Line((-11, 285), (-11, 257.5))
            ThreePointArc((-11, 257.5), (-11.439339828, 256.439339828), (-12.5, 256))
            Line((-12.5, 256), (-25, 256))
            ThreePointArc((-25, 256), (-29.242640687, 254.242640687), (-31, 250))
            Line((-31, 250), (-31, -250))
            ThreePointArc((-31, -250), (-29.242640687, -254.242640687), (-25, -256))
            Line((-25, -256), (-12.5, -256))
            ThreePointArc((-12.5, -256), (-11.439339828, -256.439339828), (-11, -257.5))
            Line((-11, -257.5), (-11, -285))
            Line((-11, -285), (-10, -285))
            Line((-10, -285), (-10, -257.5))
            ThreePointArc((-10, -257.5), (-10.732233047, -255.732233047), (-12.5, -255))
            Line((-12.5, -255), (-25, -255))
            ThreePointArc((-25, -255), (-28.535533906, -253.535533906), (-30, -250))
            Line((-30, -250), (-30, 250))
            ThreePointArc((-30, 250), (-28.535533906, 253.535533906), (-25, 255))
            Line((-25, 255), (-12.5, 255))
            ThreePointArc((-12.5, 255), (-10.732233047, 255.732233047), (-10, 257.5))
        make_face()
    extrude(amount=DAR_ESPESOR1_DEPTH)

    # Croquis7 → Extruir6 (cut)
    with BuildSketch(Plane.ZY.offset(11)):
        with Locations((-271.25, 50)):
            Circle(CROQUIS7_R)
    extruir6 = extrude(amount=-EXTRUIR6_DEPTH, mode=Mode.SUBTRACT)

    # Simetría1: Extruir6 across plane
    add(extruir6.mirror(Plane.XY), mode=Mode.SUBTRACT)


solid = Compound([part.part, body_2.part, body_3.part, body_4.part])
